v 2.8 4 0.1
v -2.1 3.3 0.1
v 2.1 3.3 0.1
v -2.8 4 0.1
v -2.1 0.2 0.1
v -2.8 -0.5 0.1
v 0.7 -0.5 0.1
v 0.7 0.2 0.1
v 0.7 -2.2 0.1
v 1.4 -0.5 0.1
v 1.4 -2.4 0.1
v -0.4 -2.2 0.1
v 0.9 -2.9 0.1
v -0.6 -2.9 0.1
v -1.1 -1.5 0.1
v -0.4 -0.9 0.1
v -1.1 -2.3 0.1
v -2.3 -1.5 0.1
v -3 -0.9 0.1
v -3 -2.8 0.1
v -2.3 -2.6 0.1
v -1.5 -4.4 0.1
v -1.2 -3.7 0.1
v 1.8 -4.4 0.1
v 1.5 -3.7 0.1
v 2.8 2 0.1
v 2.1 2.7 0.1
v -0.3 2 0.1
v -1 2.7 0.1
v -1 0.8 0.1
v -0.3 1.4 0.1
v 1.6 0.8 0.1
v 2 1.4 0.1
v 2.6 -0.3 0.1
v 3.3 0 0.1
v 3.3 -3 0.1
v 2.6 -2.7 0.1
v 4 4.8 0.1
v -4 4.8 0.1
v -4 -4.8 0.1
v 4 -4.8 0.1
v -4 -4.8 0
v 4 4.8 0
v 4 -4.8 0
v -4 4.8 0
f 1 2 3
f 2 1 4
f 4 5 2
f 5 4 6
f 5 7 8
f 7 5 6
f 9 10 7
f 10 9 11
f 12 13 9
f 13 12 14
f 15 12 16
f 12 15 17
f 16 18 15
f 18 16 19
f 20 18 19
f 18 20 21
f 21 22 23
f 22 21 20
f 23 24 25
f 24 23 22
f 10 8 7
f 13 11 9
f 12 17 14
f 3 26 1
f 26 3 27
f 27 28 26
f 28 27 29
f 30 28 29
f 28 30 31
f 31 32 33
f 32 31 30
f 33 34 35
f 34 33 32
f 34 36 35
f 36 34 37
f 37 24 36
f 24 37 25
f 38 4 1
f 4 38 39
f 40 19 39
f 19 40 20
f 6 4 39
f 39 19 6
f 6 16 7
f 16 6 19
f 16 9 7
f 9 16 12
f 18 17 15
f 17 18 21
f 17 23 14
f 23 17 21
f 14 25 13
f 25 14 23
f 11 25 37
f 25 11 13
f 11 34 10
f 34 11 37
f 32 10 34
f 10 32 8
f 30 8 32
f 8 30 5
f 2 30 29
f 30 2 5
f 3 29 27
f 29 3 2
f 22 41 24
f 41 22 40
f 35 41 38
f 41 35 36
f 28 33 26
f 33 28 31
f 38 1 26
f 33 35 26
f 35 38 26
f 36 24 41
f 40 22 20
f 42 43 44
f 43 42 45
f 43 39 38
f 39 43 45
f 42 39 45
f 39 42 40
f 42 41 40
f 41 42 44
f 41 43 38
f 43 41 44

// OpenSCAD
// file: ../p/4-4edge.scad
use <../lib.scad>
$fa=1; $fs=0.2;
function ldraw_lib__4_4edge(realsolid=false) = [
// 0 Circle 1.0
// 0 Name: 4-4edge.dat
// 0 Author: James Jessiman
// 0 !LDRAW_ORG Primitive UPDATE 2017-01
// 0 !LICENSE Licensed under CC BY 2.0 and CC BY 4.0 : see CAreadme.txt
// 
// 0 BFC CERTIFY CCW
  [0,"BFC","CERTIFY"],
  [0,"BFC","CCW"],
// 
// 0 !HISTORY 1998-12-15 [PTadmin] Official Update 1998-10
// 0 !HISTORY 2005-12-28 [PTadmin] Official Update 2005-01
// 0 !HISTORY 2007-06-24 [PTadmin] Header formatted for Contributor Agreement
// 0 !HISTORY 2008-07-01 [PTadmin] Official Update 2008-01
// 0 !HISTORY 2017-01-15 [Steffen] BFCed
// 0 !HISTORY 2017-12-30 [PTadmin] Official Update 2017-01
// 
// 
// 2 24 1 0 0 0.9239 0 0.3827
  [2,24,1,0,0,0.9239,0,0.3827],
// 2 24 0.9239 0 0.3827 0.7071 0 0.7071
  [2,24,0.9239,0,0.3827,0.7071,0,0.7071],
// 2 24 0.7071 0 0.7071 0.3827 0 0.9239
  [2,24,0.7071,0,0.7071,0.3827,0,0.9239],
// 2 24 0.3827 0 0.9239 0 0 1
  [2,24,0.3827,0,0.9239,0,0,1],
// 2 24 0 0 1 -0.3827 0 0.9239
  [2,24,0,0,1,-0.3827,0,0.9239],
// 2 24 -0.3827 0 0.9239 -0.7071 0 0.7071
  [2,24,-0.3827,0,0.9239,-0.7071,0,0.7071],
// 2 24 -0.7071 0 0.7071 -0.9239 0 0.3827
  [2,24,-0.7071,0,0.7071,-0.9239,0,0.3827],
// 2 24 -0.9239 0 0.3827 -1 0 -0
  [2,24,-0.9239,0,0.3827,-1,0,-0],
// 2 24 -1 0 -0 -0.9239 0 -0.3827
  [2,24,-1,0,-0,-0.9239,0,-0.3827],
// 2 24 -0.9239 0 -0.3827 -0.7071 0 -0.7071
  [2,24,-0.9239,0,-0.3827,-0.7071,0,-0.7071],
// 2 24 -0.7071 0 -0.7071 -0.3827 0 -0.9239
  [2,24,-0.7071,0,-0.7071,-0.3827,0,-0.9239],
// 2 24 -0.3827 0 -0.9239 0 0 -1
  [2,24,-0.3827,0,-0.9239,0,0,-1],
// 2 24 0 0 -1 0.3827 0 -0.9239
  [2,24,0,0,-1,0.3827,0,-0.9239],
// 2 24 0.3827 0 -0.9239 0.7071 0 -0.7071
  [2,24,0.3827,0,-0.9239,0.7071,0,-0.7071],
// 2 24 0.7071 0 -0.7071 0.9239 0 -0.3827
  [2,24,0.7071,0,-0.7071,0.9239,0,-0.3827],
// 2 24 0.9239 0 -0.3827 1 0 0
  [2,24,0.9239,0,-0.3827,1,0,0],
];
module ldraw_lib__4_4edge(step=0, col=false, unit=2/5, alt=false, line=0.2, solid=!$preview)
    makepoly(ldraw_lib__4_4edge(solid), step=step, col=col, unit=unit, alt=alt, line=line, solid=solid);
ldraw_lib__4_4edge(line=0.2);
// file: ../p/4-4disc.scad
use <../lib.scad>
$fa=1; $fs=0.2;
function ldraw_lib__4_4disc(realsolid=false) = [
// 0 Disc 1.0
// 0 Name: 4-4disc.dat
// 0 Author: James Jessiman
// 0 !LDRAW_ORG Primitive UPDATE 2002-02
// 0 !LICENSE Licensed under CC BY 2.0 and CC BY 4.0 : see CAreadme.txt
// 
// 0 BFC CERTIFY CCW
  [0,"BFC","CERTIFY"],
  [0,"BFC","CCW"],
// 
// 0 !HISTORY 1998-12-15 [PTadmin] Official Update 1998-10
// 0 !HISTORY 2002-03-23 [sbliss] Added BFC statement
// 0 !HISTORY 2002-04-25 [PTadmin] Official Update 2002-02
// 0 !HISTORY 2007-06-24 [PTadmin] Header formatted for Contributor Agreement
// 0 !HISTORY 2008-07-01 [PTadmin] Official Update 2008-01
// 
// 
// 3 16 0 0 0 1 0 0 0.9239 0 0.3827
  [3,16,0,0,0,1,0,0,0.9239,0,0.3827],
// 3 16 0 0 0 0.9239 0 0.3827 0.7071 0 0.7071
  [3,16,0,0,0,0.9239,0,0.3827,0.7071,0,0.7071],
// 3 16 0 0 0 0.7071 0 0.7071 0.3827 0 0.9239
  [3,16,0,0,0,0.7071,0,0.7071,0.3827,0,0.9239],
// 3 16 0 0 0 0.3827 0 0.9239 0 0 1
  [3,16,0,0,0,0.3827,0,0.9239,0,0,1],
// 3 16 0 0 0 0 0 1 -0.3827 0 0.9239
  [3,16,0,0,0,0,0,1,-0.3827,0,0.9239],
// 3 16 0 0 0 -0.3827 0 0.9239 -0.7071 0 0.7071
  [3,16,0,0,0,-0.3827,0,0.9239,-0.7071,0,0.7071],
// 3 16 0 0 0 -0.7071 0 0.7071 -0.9239 0 0.3827
  [3,16,0,0,0,-0.7071,0,0.7071,-0.9239,0,0.3827],
// 3 16 0 0 0 -0.9239 0 0.3827 -1 0 -0
  [3,16,0,0,0,-0.9239,0,0.3827,-1,0,-0],
// 3 16 0 0 0 -1 0 -0 -0.9239 0 -0.3827
  [3,16,0,0,0,-1,0,-0,-0.9239,0,-0.3827],
// 3 16 0 0 0 -0.9239 0 -0.3827 -0.7071 0 -0.7071
  [3,16,0,0,0,-0.9239,0,-0.3827,-0.7071,0,-0.7071],
// 3 16 0 0 0 -0.7071 0 -0.7071 -0.3827 0 -0.9239
  [3,16,0,0,0,-0.7071,0,-0.7071,-0.3827,0,-0.9239],
// 3 16 0 0 0 -0.3827 0 -0.9239 0 0 -1
  [3,16,0,0,0,-0.3827,0,-0.9239,0,0,-1],
// 3 16 0 0 0 0 0 -1 0.3827 0 -0.9239
  [3,16,0,0,0,0,0,-1,0.3827,0,-0.9239],
// 3 16 0 0 0 0.3827 0 -0.9239 0.7071 0 -0.7071
  [3,16,0,0,0,0.3827,0,-0.9239,0.7071,0,-0.7071],
// 3 16 0 0 0 0.7071 0 -0.7071 0.9239 0 -0.3827
  [3,16,0,0,0,0.7071,0,-0.7071,0.9239,0,-0.3827],
// 3 16 0 0 0 0.9239 0 -0.3827 1 0 0
  [3,16,0,0,0,0.9239,0,-0.3827,1,0,0],
// 0
];
module ldraw_lib__4_4disc(step=0, col=false, unit=2/5, alt=false, line=0.2, solid=!$preview)
    makepoly(ldraw_lib__4_4disc(solid), step=step, col=col, unit=unit, alt=alt, line=line, solid=solid);
ldraw_lib__4_4disc(line=0.2);
// file: ../p/4-4cyli.scad
use <../lib.scad>
$fa=1; $fs=0.2;
function ldraw_lib__4_4cyli(realsolid=false) = [
// 0 Cylinder 1.0
// 0 Name: 4-4cyli.dat
// 0 Author: James Jessiman
// 0 !LDRAW_ORG Primitive UPDATE 2005-01
// 0 !LICENSE Licensed under CC BY 2.0 and CC BY 4.0 : see CAreadme.txt
// 
// 0 BFC CERTIFY CCW
  [0,"BFC","CERTIFY"],
  [0,"BFC","CCW"],
// 
// 0 !HISTORY 1998-12-15 [PTadmin] Official Update 1998-10
// 0 !HISTORY 2002-03-23 [sbliss] Added BFC statement; merged headers from files in distributions LDraw 0.27 and Complete.
// 0 !HISTORY 2002-04-25 [PTadmin] Official Update 2002-02
// 0 !HISTORY 2004-12-14 [guyvivan] BFC CCW
// 0 !HISTORY 2005-12-28 [PTadmin] Official Update 2005-01
// 0 !HISTORY 2007-06-24 [PTadmin] Header formatted for Contributor Agreement
// 0 !HISTORY 2008-07-01 [PTadmin] Official Update 2008-01
// 
// 
// 4 16 1 1 0 0.9239 1 0.3827 0.9239 0 0.3827 1 0 0
  [4,16,1,1,0,0.9239,1,0.3827,0.9239,0,0.3827,1,0,0],
// 5 24 1 0 0 1 1 0 0.9239 0 0.3827 0.9239 0 -0.3827
  [5,24,1,0,0,1,1,0,0.9239,0,0.3827,0.9239,0,-0.3827],
// 4 16 0.9239 1 0.3827 0.7071 1 0.7071 0.7071 0 0.7071 0.9239 0 0.3827
  [4,16,0.9239,1,0.3827,0.7071,1,0.7071,0.7071,0,0.7071,0.9239,0,0.3827],
// 5 24 0.9239 0 0.3827 0.9239 1 0.3827 0.7071 0 0.7071 1 0 0
  [5,24,0.9239,0,0.3827,0.9239,1,0.3827,0.7071,0,0.7071,1,0,0],
// 4 16 0.7071 1 0.7071 0.3827 1 0.9239 0.3827 0 0.9239 0.7071 0 0.7071
  [4,16,0.7071,1,0.7071,0.3827,1,0.9239,0.3827,0,0.9239,0.7071,0,0.7071],
// 5 24 0.7071 0 0.7071 0.7071 1 0.7071 0.3827 0 0.9239 0.9239 0 0.3827
  [5,24,0.7071,0,0.7071,0.7071,1,0.7071,0.3827,0,0.9239,0.9239,0,0.3827],
// 4 16 0.3827 1 0.9239 0 1 1 0 0 1 0.3827 0 0.9239
  [4,16,0.3827,1,0.9239,0,1,1,0,0,1,0.3827,0,0.9239],
// 5 24 0.3827 0 0.9239 0.3827 1 0.9239 0 0 1 0.7071 0 0.7071
  [5,24,0.3827,0,0.9239,0.3827,1,0.9239,0,0,1,0.7071,0,0.7071],
// 4 16 0 1 1 -0.3827 1 0.9239 -0.3827 0 0.9239 0 0 1
  [4,16,0,1,1,-0.3827,1,0.9239,-0.3827,0,0.9239,0,0,1],
// 5 24 0 0 1 0 1 1 -0.3827 0 0.9239 0.3827 0 0.9239
  [5,24,0,0,1,0,1,1,-0.3827,0,0.9239,0.3827,0,0.9239],
// 4 16 -0.3827 1 0.9239 -0.7071 1 0.7071 -0.7071 0 0.7071 -0.3827 0 0.9239
  [4,16,-0.3827,1,0.9239,-0.7071,1,0.7071,-0.7071,0,0.7071,-0.3827,0,0.9239],
// 5 24 -0.3827 0 0.9239 -0.3827 1 0.9239 -0.7071 0 0.7071 0 0 1
  [5,24,-0.3827,0,0.9239,-0.3827,1,0.9239,-0.7071,0,0.7071,0,0,1],
// 4 16 -0.7071 1 0.7071 -0.9239 1 0.3827 -0.9239 0 0.3827 -0.7071 0 0.7071
  [4,16,-0.7071,1,0.7071,-0.9239,1,0.3827,-0.9239,0,0.3827,-0.7071,0,0.7071],
// 5 24 -0.7071 0 0.7071 -0.7071 1 0.7071 -0.9239 0 0.3827 -0.3827 0 0.9239
  [5,24,-0.7071,0,0.7071,-0.7071,1,0.7071,-0.9239,0,0.3827,-0.3827,0,0.9239],
// 4 16 -0.9239 1 0.3827 -1 1 0 -1 0 0 -0.9239 0 0.3827
  [4,16,-0.9239,1,0.3827,-1,1,0,-1,0,0,-0.9239,0,0.3827],
// 5 24 -0.9239 0 0.3827 -0.9239 1 0.3827 -1 0 0 -0.7071 0 0.7071
  [5,24,-0.9239,0,0.3827,-0.9239,1,0.3827,-1,0,0,-0.7071,0,0.7071],
// 4 16 -1 1 0 -0.9239 1 -0.3827 -0.9239 0 -0.3827 -1 0 0
  [4,16,-1,1,0,-0.9239,1,-0.3827,-0.9239,0,-0.3827,-1,0,0],
// 5 24 -1 0 0 -1 1 0 -0.9239 0 -0.3827 -0.9239 0 0.3827
  [5,24,-1,0,0,-1,1,0,-0.9239,0,-0.3827,-0.9239,0,0.3827],
// 4 16 -0.9239 1 -0.3827 -0.7071 1 -0.7071 -0.7071 0 -0.7071 -0.9239 0 -0.3827
  [4,16,-0.9239,1,-0.3827,-0.7071,1,-0.7071,-0.7071,0,-0.7071,-0.9239,0,-0.3827],
// 5 24 -0.9239 0 -0.3827 -0.9239 1 -0.3827 -0.7071 0 -0.7071 -1 0 0
  [5,24,-0.9239,0,-0.3827,-0.9239,1,-0.3827,-0.7071,0,-0.7071,-1,0,0],
// 4 16 -0.7071 1 -0.7071 -0.3827 1 -0.9239 -0.3827 0 -0.9239 -0.7071 0 -0.7071
  [4,16,-0.7071,1,-0.7071,-0.3827,1,-0.9239,-0.3827,0,-0.9239,-0.7071,0,-0.7071],
// 5 24 -0.7071 0 -0.7071 -0.7071 1 -0.7071 -0.3827 0 -0.9239 -0.9239 0 -0.3827
  [5,24,-0.7071,0,-0.7071,-0.7071,1,-0.7071,-0.3827,0,-0.9239,-0.9239,0,-0.3827],
// 4 16 -0.3827 1 -0.9239 0 1 -1 0 0 -1 -0.3827 0 -0.9239
  [4,16,-0.3827,1,-0.9239,0,1,-1,0,0,-1,-0.3827,0,-0.9239],
// 5 24 -0.3827 0 -0.9239 -0.3827 1 -0.9239 0 0 -1 -0.7071 0 -0.7071
  [5,24,-0.3827,0,-0.9239,-0.3827,1,-0.9239,0,0,-1,-0.7071,0,-0.7071],
// 4 16 0 1 -1 0.3827 1 -0.9239 0.3827 0 -0.9239 0 0 -1
  [4,16,0,1,-1,0.3827,1,-0.9239,0.3827,0,-0.9239,0,0,-1],
// 5 24 0 0 -1 0 1 -1 0.3827 0 -0.9239 -0.3827 0 -0.9239
  [5,24,0,0,-1,0,1,-1,0.3827,0,-0.9239,-0.3827,0,-0.9239],
// 4 16 0.3827 1 -0.9239 0.7071 1 -0.7071 0.7071 0 -0.7071 0.3827 0 -0.9239
  [4,16,0.3827,1,-0.9239,0.7071,1,-0.7071,0.7071,0,-0.7071,0.3827,0,-0.9239],
// 5 24 0.3827 0 -0.9239 0.3827 1 -0.9239 0.7071 0 -0.7071 0 0 -1
  [5,24,0.3827,0,-0.9239,0.3827,1,-0.9239,0.7071,0,-0.7071,0,0,-1],
// 4 16 0.7071 1 -0.7071 0.9239 1 -0.3827 0.9239 0 -0.3827 0.7071 0 -0.7071
  [4,16,0.7071,1,-0.7071,0.9239,1,-0.3827,0.9239,0,-0.3827,0.7071,0,-0.7071],
// 5 24 0.7071 0 -0.7071 0.7071 1 -0.7071 0.9239 0 -0.3827 0.3827 0 -0.9239
  [5,24,0.7071,0,-0.7071,0.7071,1,-0.7071,0.9239,0,-0.3827,0.3827,0,-0.9239],
// 4 16 0.9239 1 -0.3827 1 1 0 1 0 0 0.9239 0 -0.3827
  [4,16,0.9239,1,-0.3827,1,1,0,1,0,0,0.9239,0,-0.3827],
// 5 24 0.9239 0 -0.3827 0.9239 1 -0.3827 1 0 0 0.7071 0 -0.7071
  [5,24,0.9239,0,-0.3827,0.9239,1,-0.3827,1,0,0,0.7071,0,-0.7071],
// 0
];
module ldraw_lib__4_4cyli(step=0, col=false, unit=2/5, alt=false, line=0.2, solid=!$preview)
    makepoly(ldraw_lib__4_4cyli(solid), step=step, col=col, unit=unit, alt=alt, line=line, solid=solid);
ldraw_lib__4_4cyli(line=0.2);
// file: ../p/stud3.scad
use <../lib.scad>
use <4-4cyli.scad>
use <4-4disc.scad>
use <4-4edge.scad>
$fa=1; $fs=0.2;
function ldraw_lib__stud3(realsolid=false) = realsolid ? 
    [openscad(translate([0,0,-eps()], o=cylinder(4+eps(), r=4)),2)] : [
// 0 Stud Tube Solid
// 0 Name: stud3.dat
// 0 Author: James Jessiman
// 0 !LDRAW_ORG Primitive UPDATE 2012-01
// 0 !LICENSE Licensed under CC BY 2.0 and CC BY 4.0 : see CAreadme.txt
// 
// 0 BFC CERTIFY CCW
  [0,"BFC","CERTIFY"],
  [0,"BFC","CCW"],
// 
// 0 !HISTORY 2002-04-04 [sbliss] Modified for BFC compliance
// 0 !HISTORY 2002-04-25 [PTadmin] Official Update 2002-02
// 0 !HISTORY 2007-06-24 [PTadmin] Header formatted for Contributor Agreement
// 0 !HISTORY 2008-07-01 [PTadmin] Official Update 2008-01
// 0 !HISTORY 2012-02-16 [Philo] Changed to CCW
// 0 !HISTORY 2012-03-30 [PTadmin] Official Update 2012-01
// 
// 
// 1 16 0 -4 0 4 0 0 0 1 0 0 0 4 4-4edge.dat
  [1,16,0,-4,0,4,0,0,0,1,0,0,0,4, ldraw_lib__4_4edge(realsolid)],
// 1 16 0 0 0 4 0 0 0 1 0 0 0 4 4-4edge.dat
  [1,16,0,0,0,4,0,0,0,1,0,0,0,4, ldraw_lib__4_4edge(realsolid)],
// 1 16 0 -4 0 4 0 0 0 1 0 0 0 4 4-4disc.dat
  [1,16,0,-4,0,4,0,0,0,1,0,0,0,4, ldraw_lib__4_4disc(realsolid)],
// 1 16 0 -4 0 4 0 0 0 4 0 0 0 4 4-4cyli.dat
  [1,16,0,-4,0,4,0,0,0,4,0,0,0,4, ldraw_lib__4_4cyli(realsolid)],
];
module ldraw_lib__stud3(step=0, col=false, unit=2/5, alt=false, line=0.2, solid=!$preview)
    makepoly(ldraw_lib__stud3(solid), step=step, col=col, unit=unit, alt=alt, line=line, solid=solid);
ldraw_lib__stud3(line=0.2);
// file: ../p/stud.scad
use <../lib.scad>
use <4-4cyli.scad>
use <4-4disc.scad>
use <4-4edge.scad>
$fa=1; $fs=0.2;
function ldraw_lib__stud(realsolid=false) = realsolid ? 
    [openscad(translate([0,0,-eps()], o=cylinder(4+eps(), r=6)),2)] : [
// 0 Stud
// 0 Name: stud.dat
// 0 Author: James Jessiman
// 0 !LDRAW_ORG Primitive UPDATE 2012-01
// 0 !LICENSE Licensed under CC BY 2.0 and CC BY 4.0 : see CAreadme.txt
// 
// 0 BFC CERTIFY CCW
  [0,"BFC","CERTIFY"],
  [0,"BFC","CCW"],
// 
// 0 !HISTORY 2002-04-04 [sbliss] Modified for BFC compliance
// 0 !HISTORY 2002-04-25 [PTadmin] Official Update 2002-02
// 0 !HISTORY 2007-06-24 [PTadmin] Header formatted for Contributor Agreement
// 0 !HISTORY 2008-07-01 [PTadmin] Official Update 2008-01
// 0 !HISTORY 2012-02-16 [Philo] Changed to CCW
// 0 !HISTORY 2012-03-30 [PTadmin] Official Update 2012-01
// 
// 
// 1 16 0 0 0 6 0 0 0 1 0 0 0 6 4-4edge.dat
  [1,16,0,0,0,6,0,0,0,1,0,0,0,6, ldraw_lib__4_4edge(realsolid)],
// 1 16 0 -4 0 6 0 0 0 1 0 0 0 6 4-4edge.dat
  [1,16,0,-4,0,6,0,0,0,1,0,0,0,6, ldraw_lib__4_4edge(realsolid)],
// 1 16 0 0 0 6 0 0 0 -4 0 0 0 6 4-4cyli.dat
  [1,16,0,0,0,6,0,0,0,-4,0,0,0,6, ldraw_lib__4_4cyli(realsolid)],
// 1 16 0 -4 0 6 0 0 0 1 0 0 0 6 4-4disc.dat
  [1,16,0,-4,0,6,0,0,0,1,0,0,0,6, ldraw_lib__4_4disc(realsolid)],
];
module ldraw_lib__stud(step=0, col=false, unit=2/5, alt=false, line=0.2, solid=!$preview)
    makepoly(ldraw_lib__stud(solid), step=step, col=col, unit=unit, alt=alt, line=line, solid=solid);
ldraw_lib__stud(line=0.2);
// file: ../p/box5.scad
use <../lib.scad>
$fa=1; $fs=0.2;
function ldraw_lib__box5(realsolid=false) = [
// 0 Box with 5 Faces and All Edges
// 0 Name: box5.dat
// 0 Author: James Jessiman
// 0 !LDRAW_ORG Primitive UPDATE 2012-01
// 0 !LICENSE Licensed under CC BY 2.0 and CC BY 4.0 : see CAreadme.txt
// 
// 0 BFC CERTIFY CCW
  [0,"BFC","CERTIFY"],
  [0,"BFC","CCW"],
// 
// 0 !HISTORY 2002-04-03 [sbliss] Modified for BFC compliance
// 0 !HISTORY 2002-04-25 [PTadmin] Official Update 2002-02
// 0 !HISTORY 2007-06-24 [PTadmin] Header formatted for Contributor Agreement
// 0 !HISTORY 2008-07-01 [PTadmin] Official Update 2008-01
// 0 !HISTORY 2012-02-16 [Philo] Changed to CCW
// 0 !HISTORY 2012-03-30 [PTadmin] Official Update 2012-01
// 
// 
// 2 24 1 1 1 -1 1 1
  [2,24,1,1,1,-1,1,1],
// 2 24 -1 1 1 -1 1 -1
  [2,24,-1,1,1,-1,1,-1],
// 2 24 -1 1 -1 1 1 -1
  [2,24,-1,1,-1,1,1,-1],
// 2 24 1 1 -1 1 1 1
  [2,24,1,1,-1,1,1,1],
// 2 24 1 0 1 -1 0 1
  [2,24,1,0,1,-1,0,1],
// 2 24 -1 0 1 -1 0 -1
  [2,24,-1,0,1,-1,0,-1],
// 2 24 -1 0 -1 1 0 -1
  [2,24,-1,0,-1,1,0,-1],
// 2 24 1 0 -1 1 0 1
  [2,24,1,0,-1,1,0,1],
// 2 24 1 0 1 1 1 1
  [2,24,1,0,1,1,1,1],
// 2 24 -1 0 1 -1 1 1
  [2,24,-1,0,1,-1,1,1],
// 2 24 1 0 -1 1 1 -1
  [2,24,1,0,-1,1,1,-1],
// 2 24 -1 0 -1 -1 1 -1
  [2,24,-1,0,-1,-1,1,-1],
// 4 16 -1 1 1 1 1 1 1 1 -1 -1 1 -1
  [4,16,-1,1,1,1,1,1,1,1,-1,-1,1,-1],
// 4 16 -1 1 1 -1 0 1 1 0 1 1 1 1
  [4,16,-1,1,1,-1,0,1,1,0,1,1,1,1],
// 4 16 -1 1 -1 -1 0 -1 -1 0 1 -1 1 1
  [4,16,-1,1,-1,-1,0,-1,-1,0,1,-1,1,1],
// 4 16 1 1 -1 1 0 -1 -1 0 -1 -1 1 -1
  [4,16,1,1,-1,1,0,-1,-1,0,-1,-1,1,-1],
// 4 16 1 1 1 1 0 1 1 0 -1 1 1 -1
  [4,16,1,1,1,1,0,1,1,0,-1,1,1,-1],
];
module ldraw_lib__box5(step=0, col=false, unit=2/5, alt=false, line=0.2, solid=!$preview)
    makepoly(ldraw_lib__box5(solid), step=step, col=col, unit=unit, alt=alt, line=line, solid=solid);
ldraw_lib__box5(line=0.2);
// file: ../p/box4t.scad
use <../lib.scad>
$fa=1; $fs=0.2;
function ldraw_lib__box4t(realsolid=false) = [
// 0 Box with 4 Adjacent Faces and All Edges
// 0 Name: box4t.dat
// 0 Author: Tore Eriksson [Tore_Eriksson]
// 0 !LDRAW_ORG Primitive UPDATE 2003-02
// 0 !LICENSE Licensed under CC BY 2.0 and CC BY 4.0 : see CAreadme.txt
// 
// 0 BFC CERTIFY CCW
  [0,"BFC","CERTIFY"],
  [0,"BFC","CCW"],
// 
// 0 !HISTORY 1997-09-29 [PTadmin] Official Update 1997-15
// 0 !HISTORY 2002-08-31 [izanette] Modified with WINDZ for BFC compliance
// 0 !HISTORY 2003-08-01 [PTadmin] Official Update 2003-02
// 0 !HISTORY 2007-06-24 [PTadmin] Header formatted for Contributor Agreement
// 0 !HISTORY 2008-07-01 [PTadmin] Official Update 2008-01
// 
// 
// 2 24 1 1 1 -1 1 1
  [2,24,1,1,1,-1,1,1],
// 2 24 -1 1 1 -1 1 -1
  [2,24,-1,1,1,-1,1,-1],
// 2 24 -1 1 -1 1 1 -1
  [2,24,-1,1,-1,1,1,-1],
// 2 24 1 1 -1 1 1 1
  [2,24,1,1,-1,1,1,1],
// 2 24 1 0 1 -1 0 1
  [2,24,1,0,1,-1,0,1],
// 2 24 -1 0 1 -1 0 -1
  [2,24,-1,0,1,-1,0,-1],
// 2 24 -1 0 -1 1 0 -1
  [2,24,-1,0,-1,1,0,-1],
// 2 24 1 0 -1 1 0 1
  [2,24,1,0,-1,1,0,1],
// 2 24 1 0 1 1 1 1
  [2,24,1,0,1,1,1,1],
// 2 24 -1 0 1 -1 1 1
  [2,24,-1,0,1,-1,1,1],
// 2 24 1 0 -1 1 1 -1
  [2,24,1,0,-1,1,1,-1],
// 2 24 -1 0 -1 -1 1 -1
  [2,24,-1,0,-1,-1,1,-1],
// 4 16 1 1 1 1 1 -1 -1 1 -1 -1 1 1
  [4,16,1,1,1,1,1,-1,-1,1,-1,-1,1,1],
// 4 16 1 1 1 -1 1 1 -1 0 1 1 0 1
  [4,16,1,1,1,-1,1,1,-1,0,1,1,0,1],
// 4 16 -1 1 1 -1 1 -1 -1 0 -1 -1 0 1
  [4,16,-1,1,1,-1,1,-1,-1,0,-1,-1,0,1],
// 0 4 16 -1 1 -1 -1 0 -1 1 0 -1 1 1 -1
// 4 16 1 1 -1 1 1 1 1 0 1 1 0 -1
  [4,16,1,1,-1,1,1,1,1,0,1,1,0,-1],
// 0
];
module ldraw_lib__box4t(step=0, col=false, unit=2/5, alt=false, line=0.2, solid=!$preview)
    makepoly(ldraw_lib__box4t(solid), step=step, col=col, unit=unit, alt=alt, line=line, solid=solid);
ldraw_lib__box4t(line=0.2);
// file: s/3004s01.scad
use <../../lib.scad>
use <../../p/box4t.scad>
use <../../p/box5.scad>
use <../../p/stud.scad>
use <../../p/stud3.scad>
$fa=1; $fs=0.2;
function ldraw_lib__s__3004s01(realsolid=false) = [
// 0 ~Brick  1 x  2 without Front Face
// 0 Name: s\3004s01.dat
// 0 Author: James Jessiman
// 0 !LDRAW_ORG Subpart UPDATE 2003-03
// 0 !LICENSE Licensed under CC BY 2.0 and CC BY 4.0 : see CAreadme.txt
// 
// 0 BFC CERTIFY CCW
  [0,"BFC","CERTIFY"],
  [0,"BFC","CCW"],
// 
// 0 !HISTORY 2003-09-07 [jriley] Subfiling, BFC
// 0 !HISTORY 2003-12-19 [PTadmin] Official Update 2003-03
// 0 !HISTORY 2007-08-29 [PTadmin] Header formatted for Contributor Agreement
// 0 !HISTORY 2008-07-01 [PTadmin] Official Update 2008-01
// 
// 
// 1 16 0 4 0 1 0 0 0 -5 0 0 0 1 stud3.dat
  [1,16,0,4,0,1,0,0,0,-5,0,0,0,1, ldraw_lib__stud3(realsolid)],
// 0 BFC INVERTNEXT
  [0,"BFC","INVERTNEXT"],
// 1 16 0 24 0 16 0 0 0 -20 0 0 0 6 box5.dat
  [1,16,0,24,0,16,0,0,0,-20,0,0,0,6, ldraw_lib__box5(realsolid)],
// 4 16 20 24 10 16 24 6 -16 24 6 -20 24 10
  [4,16,20,24,10,16,24,6,-16,24,6,-20,24,10],
// 4 16 -20 24 10 -16 24 6 -16 24 -6 -20 24 -10
  [4,16,-20,24,10,-16,24,6,-16,24,-6,-20,24,-10],
// 4 16 -20 24 -10 -16 24 -6 16 24 -6 20 24 -10
  [4,16,-20,24,-10,-16,24,-6,16,24,-6,20,24,-10],
// 4 16 20 24 -10 16 24 -6 16 24 6 20 24 10
  [4,16,20,24,-10,16,24,-6,16,24,6,20,24,10],
// 1 16 0 24 0 20 0 0 0 -24 0 0 0 10 box4t.dat
  [1,16,0,24,0,20,0,0,0,-24,0,0,0,10, ldraw_lib__box4t(realsolid)],
// 1 16 10 0 0 1 0 0 0 1 0 0 0 1 stud.dat
  [1,16,10,0,0,1,0,0,0,1,0,0,0,1, ldraw_lib__stud(realsolid)],
// 1 16 -10 0 0 1 0 0 0 1 0 0 0 1 stud.dat
  [1,16,-10,0,0,1,0,0,0,1,0,0,0,1, ldraw_lib__stud(realsolid)],
// 0
];
module ldraw_lib__s__3004s01(step=0, col=false, unit=2/5, alt=false, line=0.2, solid=!$preview)
    makepoly(ldraw_lib__s__3004s01(solid), step=step, col=col, unit=unit, alt=alt, line=line, solid=solid);
ldraw_lib__s__3004s01(line=0.2);
// file: 3004.scad
use <../lib.scad>
use <s/3004s01.scad>
$fa=1; $fs=0.2;
function ldraw_lib__3004(realsolid=false) = [
// 0 Brick  1 x  2
// 0 Name: 3004.dat
// 0 Author: James Jessiman
// 0 !LDRAW_ORG Part UPDATE 2022-05
// 0 !LICENSE Licensed under CC BY 2.0 and CC BY 4.0 : see CAreadme.txt
// 
// 0 BFC CERTIFY CCW
  [0,"BFC","CERTIFY"],
  [0,"BFC","CCW"],
// 
// 0 !HISTORY 2001-10-26 [PTadmin] Official Update 2001-01
// 0 !HISTORY 2002-05-07 {unknown} BFC Certification
// 0 !HISTORY 2002-06-11 [PTadmin] Official Update 2002-03
// 0 !HISTORY 2007-05-07 [PTadmin] Header formatted for Contributor Agreement
// 0 !HISTORY 2008-07-01 [PTadmin] Official Update 2008-01
// 0 !HISTORY 2022-08-04 [MagFors] Using subfile
// 0 !HISTORY 2022-09-15 [PTadmin] Official Update 2022-05
// 
// 
// 1 16 0 0 0 1 0 0 0 1 0 0 0 1 s\3004s01.dat
  [1,16,0,0,0,1,0,0,0,1,0,0,0,1, ldraw_lib__s__3004s01(realsolid)],
// 4 16 -20 24 -10 20 24 -10 20 0 -10 -20 0 -10
  [4,16,-20,24,-10,20,24,-10,20,0,-10,-20,0,-10],
];
module ldraw_lib__3004(step=0, col=false, unit=2/5, alt=false, line=0.2, solid=!$preview)
    makepoly(ldraw_lib__3004(solid), step=step, col=col, unit=unit, alt=alt, line=line, solid=solid);
ldraw_lib__3004(line=0.2);
// file: ../p/box5-12.scad
use <../lib.scad>
$fa=1; $fs=0.2;
function ldraw_lib__box5_12(realsolid=false) = [
// 0 Box with 5 Faces without Any Edges
// 0 Name: box5-12.dat
// 0 Author: Chris Dee [cwdee]
// 0 !LDRAW_ORG Primitive UPDATE 2009-02
// 0 !LICENSE Licensed under CC BY 2.0 and CC BY 4.0 : see CAreadme.txt
// 
// 0 BFC CERTIFY CCW
  [0,"BFC","CERTIFY"],
  [0,"BFC","CCW"],
// 
// 0 !HISTORY 2009-09-03 [PTadmin] Official Update 2009-02
// 
// 
// 4 16 1 1 1 1 1 -1 -1 1 -1 -1 1 1
  [4,16,1,1,1,1,1,-1,-1,1,-1,-1,1,1],
// 4 16 -1 0 1 1 0 1 1 1 1 -1 1 1
  [4,16,-1,0,1,1,0,1,1,1,1,-1,1,1],
// 4 16 -1 0 -1 -1 0 1 -1 1 1 -1 1 -1
  [4,16,-1,0,-1,-1,0,1,-1,1,1,-1,1,-1],
// 4 16 1 0 -1 -1 0 -1 -1 1 -1 1 1 -1
  [4,16,1,0,-1,-1,0,-1,-1,1,-1,1,1,-1],
// 4 16 1 0 1 1 0 -1 1 1 -1 1 1 1
  [4,16,1,0,1,1,0,-1,1,1,-1,1,1,1],
// 0
];
module ldraw_lib__box5_12(step=0, col=false, unit=2/5, alt=false, line=0.2, solid=!$preview)
    makepoly(ldraw_lib__box5_12(solid), step=step, col=col, unit=unit, alt=alt, line=line, solid=solid);
ldraw_lib__box5_12(line=0.2);
// main file
use <../lib.scad>
use <../p/box5-12.scad>
$fa=1; $fs=0.2;
function ldraw_lib__164365c(realsolid=false) = [
// 0 Sticker  1.2 x  1 with Red Outline "5"
// 0 Name: 164365c.dat
// 0 Author: Michael Heidemann [mikeheide]
// 0 !LDRAW_ORG Part UPDATE 2012-02
// 0 !LICENSE Licensed under CC BY 2.0 and CC BY 4.0 : see CAreadme.txt
// 
// 0 BFC CERTIFY CCW
  [0,"BFC","CERTIFY"],
  [0,"BFC","CCW"],
// 
// 0 !KEYWORDS set 6440
// 
// 0 !HISTORY 2012-08-09 [PTadmin] Official Update 2012-02
// 
// 
// 4 4 5.25 -0.25 8.25 7 -0.25 10 -7 -0.25 10 -5.25 -0.25 8.25
  [4,4,5.25,-0.25,8.25,7,-0.25,10,-7,-0.25,10,-5.25,-0.25,8.25],
// 4 4 -5.25 -0.25 0.5 -5.25 -0.25 8.25 -7 -0.25 10 -7 -0.25 -1.25
  [4,4,-5.25,-0.25,0.5,-5.25,-0.25,8.25,-7,-0.25,10,-7,-0.25,-1.25],
// 4 4 -7 -0.25 -1.25 1.75 -0.25 -1.25 1.75 -0.25 0.5 -5.25 -0.25 0.5
  [4,4,-7,-0.25,-1.25,1.75,-0.25,-1.25,1.75,-0.25,0.5,-5.25,-0.25,0.5],
// 4 4 3.5 -0.25 -6 3.5 -0.25 -1.25 1.75 -0.25 -1.25 1.75 -0.25 -5.5
  [4,4,3.5,-0.25,-6,3.5,-0.25,-1.25,1.75,-0.25,-1.25,1.75,-0.25,-5.5],
// 4 4 1.75 -0.25 -5.5 -1 -0.25 -5.5 -1.5 -0.25 -7.25 2.25 -0.25 -7.25
  [4,4,1.75,-0.25,-5.5,-1,-0.25,-5.5,-1.5,-0.25,-7.25,2.25,-0.25,-7.25],
// 4 4 -2.75 -0.25 -3.75 -2.75 -0.25 -5.75 -1 -0.25 -5.5 -1 -0.25 -2.25
  [4,4,-2.75,-0.25,-3.75,-2.75,-0.25,-5.75,-1,-0.25,-5.5,-1,-0.25,-2.25],
// 4 4 -1 -0.25 -2.25 -7.5 -0.25 -2.25 -5.75 -0.25 -3.75 -2.75 -0.25 -3.75
  [4,4,-1,-0.25,-2.25,-7.5,-0.25,-2.25,-5.75,-0.25,-3.75,-2.75,-0.25,-3.75],
// 4 4 -7.5 -0.25 -2.25 -7.5 -0.25 -7 -5.75 -0.25 -6.5 -5.75 -0.25 -3.75
  [4,4,-7.5,-0.25,-2.25,-7.5,-0.25,-7,-5.75,-0.25,-6.5,-5.75,-0.25,-3.75],
// 4 4 -3.75 -0.25 -11 -3 -0.25 -9.25 -5.75 -0.25 -6.5 -7.5 -0.25 -7
  [4,4,-3.75,-0.25,-11,-3,-0.25,-9.25,-5.75,-0.25,-6.5,-7.5,-0.25,-7],
// 4 4 4.5 -0.25 -11 3.75 -0.25 -9.25 -3 -0.25 -9.25 -3.75 -0.25 -11
  [4,4,4.5,-0.25,-11,3.75,-0.25,-9.25,-3,-0.25,-9.25,-3.75,-0.25,-11],
// 3 4 3.5 -0.25 -1.25 1.75 -0.25 0.5 1.75 -0.25 -1.25
  [3,4,3.5,-0.25,-1.25,1.75,-0.25,0.5,1.75,-0.25,-1.25],
// 3 4 2.25 -0.25 -7.25 3.5 -0.25 -6 1.75 -0.25 -5.5
  [3,4,2.25,-0.25,-7.25,3.5,-0.25,-6,1.75,-0.25,-5.5],
// 3 4 -1 -0.25 -5.5 -2.75 -0.25 -5.75 -1.5 -0.25 -7.25
  [3,4,-1,-0.25,-5.5,-2.75,-0.25,-5.75,-1.5,-0.25,-7.25],
// 4 4 7 -0.25 5 7 -0.25 10 5.25 -0.25 8.25 5.25 -0.25 6.75
  [4,4,7,-0.25,5,7,-0.25,10,5.25,-0.25,8.25,5.25,-0.25,6.75],
// 4 4 -0.75 -0.25 5 7 -0.25 5 5.25 -0.25 6.75 -2.5 -0.25 6.75
  [4,4,-0.75,-0.25,5,7,-0.25,5,5.25,-0.25,6.75,-2.5,-0.25,6.75],
// 4 4 -0.75 -0.25 3.5 -0.75 -0.25 5 -2.5 -0.25 6.75 -2.5 -0.25 2
  [4,4,-0.75,-0.25,3.5,-0.75,-0.25,5,-2.5,-0.25,6.75,-2.5,-0.25,2],
// 4 4 5 -0.25 3.5 -0.75 -0.25 3.5 -2.5 -0.25 2 4 -0.25 2
  [4,4,5,-0.25,3.5,-0.75,-0.25,3.5,-2.5,-0.25,2,4,-0.25,2],
// 4 4 8.25 -0.25 0 5 -0.25 3.5 4 -0.25 2 6.5 -0.25 -0.75
  [4,4,8.25,-0.25,0,5,-0.25,3.5,4,-0.25,2,6.5,-0.25,-0.75],
// 4 4 8.25 -0.25 -7.5 8.25 -0.25 0 6.5 -0.25 -0.75 6.5 -0.25 -6.75
  [4,4,8.25,-0.25,-7.5,8.25,-0.25,0,6.5,-0.25,-0.75,6.5,-0.25,-6.75],
// 4 4 6.5 -0.25 -6.75 3.75 -0.25 -9.25 4.5 -0.25 -11 8.25 -0.25 -7.5
  [4,4,6.5,-0.25,-6.75,3.75,-0.25,-9.25,4.5,-0.25,-11,8.25,-0.25,-7.5],
// 4 16 -10 -0.25 12 -7 -0.25 10 7 -0.25 10 10 -0.25 12
  [4,16,-10,-0.25,12,-7,-0.25,10,7,-0.25,10,10,-0.25,12],
// 4 16 -10 -0.25 -12 -7.5 -0.25 -7 -7.5 -0.25 -2.25 -10 -0.25 12
  [4,16,-10,-0.25,-12,-7.5,-0.25,-7,-7.5,-0.25,-2.25,-10,-0.25,12],
// 3 16 -7 -0.25 -1.25 -7 -0.25 10 -10 -0.25 12
  [3,16,-7,-0.25,-1.25,-7,-0.25,10,-10,-0.25,12],
// 3 16 -10 -0.25 12 -7.5 -0.25 -2.25 -7 -0.25 -1.25
  [3,16,-10,-0.25,12,-7.5,-0.25,-2.25,-7,-0.25,-1.25],
// 4 16 -7 -0.25 -1.25 -7.5 -0.25 -2.25 -1 -0.25 -2.25 1.75 -0.25 -1.25
  [4,16,-7,-0.25,-1.25,-7.5,-0.25,-2.25,-1,-0.25,-2.25,1.75,-0.25,-1.25],
// 4 16 1.75 -0.25 -1.25 -1 -0.25 -2.25 -1 -0.25 -5.5 1.75 -0.25 -5.5
  [4,16,1.75,-0.25,-1.25,-1,-0.25,-2.25,-1,-0.25,-5.5,1.75,-0.25,-5.5],
// 4 16 -2.75 -0.25 -5.75 -2.75 -0.25 -3.75 -5.75 -0.25 -3.75 -5.75 -0.25 -6.5
  [4,16,-2.75,-0.25,-5.75,-2.75,-0.25,-3.75,-5.75,-0.25,-3.75,-5.75,-0.25,-6.5],
// 4 16 -1.5 -0.25 -7.25 -2.75 -0.25 -5.75 -5.75 -0.25 -6.5 -3 -0.25 -9.25
  [4,16,-1.5,-0.25,-7.25,-2.75,-0.25,-5.75,-5.75,-0.25,-6.5,-3,-0.25,-9.25],
// 4 16 2.25 -0.25 -7.25 -1.5 -0.25 -7.25 -3 -0.25 -9.25 3.75 -0.25 -9.25
  [4,16,2.25,-0.25,-7.25,-1.5,-0.25,-7.25,-3,-0.25,-9.25,3.75,-0.25,-9.25],
// 4 16 6.5 -0.25 -6.75 3.5 -0.25 -6 2.25 -0.25 -7.25 3.75 -0.25 -9.25
  [4,16,6.5,-0.25,-6.75,3.5,-0.25,-6,2.25,-0.25,-7.25,3.75,-0.25,-9.25],
// 4 16 6.5 -0.25 -0.75 3.5 -0.25 -1.25 3.5 -0.25 -6 6.5 -0.25 -6.75
  [4,16,6.5,-0.25,-0.75,3.5,-0.25,-1.25,3.5,-0.25,-6,6.5,-0.25,-6.75],
// 4 16 4 -0.25 2 1.75 -0.25 0.5 3.5 -0.25 -1.25 6.5 -0.25 -0.75
  [4,16,4,-0.25,2,1.75,-0.25,0.5,3.5,-0.25,-1.25,6.5,-0.25,-0.75],
// 4 16 1.75 -0.25 0.5 4 -0.25 2 -2.5 -0.25 2 -5.25 -0.25 0.5
  [4,16,1.75,-0.25,0.5,4,-0.25,2,-2.5,-0.25,2,-5.25,-0.25,0.5],
// 4 16 -2.5 -0.25 6.75 -5.25 -0.25 8.25 -5.25 -0.25 0.5 -2.5 -0.25 2
  [4,16,-2.5,-0.25,6.75,-5.25,-0.25,8.25,-5.25,-0.25,0.5,-2.5,-0.25,2],
// 4 16 5.25 -0.25 6.75 5.25 -0.25 8.25 -5.25 -0.25 8.25 -2.5 -0.25 6.75
  [4,16,5.25,-0.25,6.75,5.25,-0.25,8.25,-5.25,-0.25,8.25,-2.5,-0.25,6.75],
// 4 16 4.5 -0.25 -11 -3.75 -0.25 -11 -10 -0.25 -12 10 -0.25 -12
  [4,16,4.5,-0.25,-11,-3.75,-0.25,-11,-10,-0.25,-12,10,-0.25,-12],
// 4 16 8.25 -0.25 0 8.25 -0.25 -7.5 10 -0.25 -12 10 -0.25 12
  [4,16,8.25,-0.25,0,8.25,-0.25,-7.5,10,-0.25,-12,10,-0.25,12],
// 4 16 5 -0.25 3.5 7 -0.25 5 -0.75 -0.25 5 -0.75 -0.25 3.5
  [4,16,5,-0.25,3.5,7,-0.25,5,-0.75,-0.25,5,-0.75,-0.25,3.5],
// 3 16 10 -0.25 12 7 -0.25 10 7 -0.25 5
  [3,16,10,-0.25,12,7,-0.25,10,7,-0.25,5],
// 3 16 5 -0.25 3.5 8.25 -0.25 0 7 -0.25 5
  [3,16,5,-0.25,3.5,8.25,-0.25,0,7,-0.25,5],
// 3 16 8.25 -0.25 0 10 -0.25 12 7 -0.25 5
  [3,16,8.25,-0.25,0,10,-0.25,12,7,-0.25,5],
// 3 16 8.25 -0.25 -7.5 4.5 -0.25 -11 10 -0.25 -12
  [3,16,8.25,-0.25,-7.5,4.5,-0.25,-11,10,-0.25,-12],
// 3 16 -10 -0.25 -12 -3.75 -0.25 -11 -7.5 -0.25 -7
  [3,16,-10,-0.25,-12,-3.75,-0.25,-11,-7.5,-0.25,-7],
// 0 // Pattern created wholly or in part by Quad2Dat
// 0 // Thanks James
// 1 16 0 -0.25 0 10 0 0 0 0.25 0 0 0 12 box5-12.dat
  [1,16,0,-0.25,0,10,0,0,0,0.25,0,0,0,12, ldraw_lib__box5_12(realsolid)],
];
module ldraw_lib__164365c(step=0, col=false, unit=2/5, alt=false, line=0.2, solid=!$preview)
    makepoly(ldraw_lib__164365c(solid), step=step, col=col, unit=unit, alt=alt, line=line, solid=solid);
ldraw_lib__164365c(line=0.2);
